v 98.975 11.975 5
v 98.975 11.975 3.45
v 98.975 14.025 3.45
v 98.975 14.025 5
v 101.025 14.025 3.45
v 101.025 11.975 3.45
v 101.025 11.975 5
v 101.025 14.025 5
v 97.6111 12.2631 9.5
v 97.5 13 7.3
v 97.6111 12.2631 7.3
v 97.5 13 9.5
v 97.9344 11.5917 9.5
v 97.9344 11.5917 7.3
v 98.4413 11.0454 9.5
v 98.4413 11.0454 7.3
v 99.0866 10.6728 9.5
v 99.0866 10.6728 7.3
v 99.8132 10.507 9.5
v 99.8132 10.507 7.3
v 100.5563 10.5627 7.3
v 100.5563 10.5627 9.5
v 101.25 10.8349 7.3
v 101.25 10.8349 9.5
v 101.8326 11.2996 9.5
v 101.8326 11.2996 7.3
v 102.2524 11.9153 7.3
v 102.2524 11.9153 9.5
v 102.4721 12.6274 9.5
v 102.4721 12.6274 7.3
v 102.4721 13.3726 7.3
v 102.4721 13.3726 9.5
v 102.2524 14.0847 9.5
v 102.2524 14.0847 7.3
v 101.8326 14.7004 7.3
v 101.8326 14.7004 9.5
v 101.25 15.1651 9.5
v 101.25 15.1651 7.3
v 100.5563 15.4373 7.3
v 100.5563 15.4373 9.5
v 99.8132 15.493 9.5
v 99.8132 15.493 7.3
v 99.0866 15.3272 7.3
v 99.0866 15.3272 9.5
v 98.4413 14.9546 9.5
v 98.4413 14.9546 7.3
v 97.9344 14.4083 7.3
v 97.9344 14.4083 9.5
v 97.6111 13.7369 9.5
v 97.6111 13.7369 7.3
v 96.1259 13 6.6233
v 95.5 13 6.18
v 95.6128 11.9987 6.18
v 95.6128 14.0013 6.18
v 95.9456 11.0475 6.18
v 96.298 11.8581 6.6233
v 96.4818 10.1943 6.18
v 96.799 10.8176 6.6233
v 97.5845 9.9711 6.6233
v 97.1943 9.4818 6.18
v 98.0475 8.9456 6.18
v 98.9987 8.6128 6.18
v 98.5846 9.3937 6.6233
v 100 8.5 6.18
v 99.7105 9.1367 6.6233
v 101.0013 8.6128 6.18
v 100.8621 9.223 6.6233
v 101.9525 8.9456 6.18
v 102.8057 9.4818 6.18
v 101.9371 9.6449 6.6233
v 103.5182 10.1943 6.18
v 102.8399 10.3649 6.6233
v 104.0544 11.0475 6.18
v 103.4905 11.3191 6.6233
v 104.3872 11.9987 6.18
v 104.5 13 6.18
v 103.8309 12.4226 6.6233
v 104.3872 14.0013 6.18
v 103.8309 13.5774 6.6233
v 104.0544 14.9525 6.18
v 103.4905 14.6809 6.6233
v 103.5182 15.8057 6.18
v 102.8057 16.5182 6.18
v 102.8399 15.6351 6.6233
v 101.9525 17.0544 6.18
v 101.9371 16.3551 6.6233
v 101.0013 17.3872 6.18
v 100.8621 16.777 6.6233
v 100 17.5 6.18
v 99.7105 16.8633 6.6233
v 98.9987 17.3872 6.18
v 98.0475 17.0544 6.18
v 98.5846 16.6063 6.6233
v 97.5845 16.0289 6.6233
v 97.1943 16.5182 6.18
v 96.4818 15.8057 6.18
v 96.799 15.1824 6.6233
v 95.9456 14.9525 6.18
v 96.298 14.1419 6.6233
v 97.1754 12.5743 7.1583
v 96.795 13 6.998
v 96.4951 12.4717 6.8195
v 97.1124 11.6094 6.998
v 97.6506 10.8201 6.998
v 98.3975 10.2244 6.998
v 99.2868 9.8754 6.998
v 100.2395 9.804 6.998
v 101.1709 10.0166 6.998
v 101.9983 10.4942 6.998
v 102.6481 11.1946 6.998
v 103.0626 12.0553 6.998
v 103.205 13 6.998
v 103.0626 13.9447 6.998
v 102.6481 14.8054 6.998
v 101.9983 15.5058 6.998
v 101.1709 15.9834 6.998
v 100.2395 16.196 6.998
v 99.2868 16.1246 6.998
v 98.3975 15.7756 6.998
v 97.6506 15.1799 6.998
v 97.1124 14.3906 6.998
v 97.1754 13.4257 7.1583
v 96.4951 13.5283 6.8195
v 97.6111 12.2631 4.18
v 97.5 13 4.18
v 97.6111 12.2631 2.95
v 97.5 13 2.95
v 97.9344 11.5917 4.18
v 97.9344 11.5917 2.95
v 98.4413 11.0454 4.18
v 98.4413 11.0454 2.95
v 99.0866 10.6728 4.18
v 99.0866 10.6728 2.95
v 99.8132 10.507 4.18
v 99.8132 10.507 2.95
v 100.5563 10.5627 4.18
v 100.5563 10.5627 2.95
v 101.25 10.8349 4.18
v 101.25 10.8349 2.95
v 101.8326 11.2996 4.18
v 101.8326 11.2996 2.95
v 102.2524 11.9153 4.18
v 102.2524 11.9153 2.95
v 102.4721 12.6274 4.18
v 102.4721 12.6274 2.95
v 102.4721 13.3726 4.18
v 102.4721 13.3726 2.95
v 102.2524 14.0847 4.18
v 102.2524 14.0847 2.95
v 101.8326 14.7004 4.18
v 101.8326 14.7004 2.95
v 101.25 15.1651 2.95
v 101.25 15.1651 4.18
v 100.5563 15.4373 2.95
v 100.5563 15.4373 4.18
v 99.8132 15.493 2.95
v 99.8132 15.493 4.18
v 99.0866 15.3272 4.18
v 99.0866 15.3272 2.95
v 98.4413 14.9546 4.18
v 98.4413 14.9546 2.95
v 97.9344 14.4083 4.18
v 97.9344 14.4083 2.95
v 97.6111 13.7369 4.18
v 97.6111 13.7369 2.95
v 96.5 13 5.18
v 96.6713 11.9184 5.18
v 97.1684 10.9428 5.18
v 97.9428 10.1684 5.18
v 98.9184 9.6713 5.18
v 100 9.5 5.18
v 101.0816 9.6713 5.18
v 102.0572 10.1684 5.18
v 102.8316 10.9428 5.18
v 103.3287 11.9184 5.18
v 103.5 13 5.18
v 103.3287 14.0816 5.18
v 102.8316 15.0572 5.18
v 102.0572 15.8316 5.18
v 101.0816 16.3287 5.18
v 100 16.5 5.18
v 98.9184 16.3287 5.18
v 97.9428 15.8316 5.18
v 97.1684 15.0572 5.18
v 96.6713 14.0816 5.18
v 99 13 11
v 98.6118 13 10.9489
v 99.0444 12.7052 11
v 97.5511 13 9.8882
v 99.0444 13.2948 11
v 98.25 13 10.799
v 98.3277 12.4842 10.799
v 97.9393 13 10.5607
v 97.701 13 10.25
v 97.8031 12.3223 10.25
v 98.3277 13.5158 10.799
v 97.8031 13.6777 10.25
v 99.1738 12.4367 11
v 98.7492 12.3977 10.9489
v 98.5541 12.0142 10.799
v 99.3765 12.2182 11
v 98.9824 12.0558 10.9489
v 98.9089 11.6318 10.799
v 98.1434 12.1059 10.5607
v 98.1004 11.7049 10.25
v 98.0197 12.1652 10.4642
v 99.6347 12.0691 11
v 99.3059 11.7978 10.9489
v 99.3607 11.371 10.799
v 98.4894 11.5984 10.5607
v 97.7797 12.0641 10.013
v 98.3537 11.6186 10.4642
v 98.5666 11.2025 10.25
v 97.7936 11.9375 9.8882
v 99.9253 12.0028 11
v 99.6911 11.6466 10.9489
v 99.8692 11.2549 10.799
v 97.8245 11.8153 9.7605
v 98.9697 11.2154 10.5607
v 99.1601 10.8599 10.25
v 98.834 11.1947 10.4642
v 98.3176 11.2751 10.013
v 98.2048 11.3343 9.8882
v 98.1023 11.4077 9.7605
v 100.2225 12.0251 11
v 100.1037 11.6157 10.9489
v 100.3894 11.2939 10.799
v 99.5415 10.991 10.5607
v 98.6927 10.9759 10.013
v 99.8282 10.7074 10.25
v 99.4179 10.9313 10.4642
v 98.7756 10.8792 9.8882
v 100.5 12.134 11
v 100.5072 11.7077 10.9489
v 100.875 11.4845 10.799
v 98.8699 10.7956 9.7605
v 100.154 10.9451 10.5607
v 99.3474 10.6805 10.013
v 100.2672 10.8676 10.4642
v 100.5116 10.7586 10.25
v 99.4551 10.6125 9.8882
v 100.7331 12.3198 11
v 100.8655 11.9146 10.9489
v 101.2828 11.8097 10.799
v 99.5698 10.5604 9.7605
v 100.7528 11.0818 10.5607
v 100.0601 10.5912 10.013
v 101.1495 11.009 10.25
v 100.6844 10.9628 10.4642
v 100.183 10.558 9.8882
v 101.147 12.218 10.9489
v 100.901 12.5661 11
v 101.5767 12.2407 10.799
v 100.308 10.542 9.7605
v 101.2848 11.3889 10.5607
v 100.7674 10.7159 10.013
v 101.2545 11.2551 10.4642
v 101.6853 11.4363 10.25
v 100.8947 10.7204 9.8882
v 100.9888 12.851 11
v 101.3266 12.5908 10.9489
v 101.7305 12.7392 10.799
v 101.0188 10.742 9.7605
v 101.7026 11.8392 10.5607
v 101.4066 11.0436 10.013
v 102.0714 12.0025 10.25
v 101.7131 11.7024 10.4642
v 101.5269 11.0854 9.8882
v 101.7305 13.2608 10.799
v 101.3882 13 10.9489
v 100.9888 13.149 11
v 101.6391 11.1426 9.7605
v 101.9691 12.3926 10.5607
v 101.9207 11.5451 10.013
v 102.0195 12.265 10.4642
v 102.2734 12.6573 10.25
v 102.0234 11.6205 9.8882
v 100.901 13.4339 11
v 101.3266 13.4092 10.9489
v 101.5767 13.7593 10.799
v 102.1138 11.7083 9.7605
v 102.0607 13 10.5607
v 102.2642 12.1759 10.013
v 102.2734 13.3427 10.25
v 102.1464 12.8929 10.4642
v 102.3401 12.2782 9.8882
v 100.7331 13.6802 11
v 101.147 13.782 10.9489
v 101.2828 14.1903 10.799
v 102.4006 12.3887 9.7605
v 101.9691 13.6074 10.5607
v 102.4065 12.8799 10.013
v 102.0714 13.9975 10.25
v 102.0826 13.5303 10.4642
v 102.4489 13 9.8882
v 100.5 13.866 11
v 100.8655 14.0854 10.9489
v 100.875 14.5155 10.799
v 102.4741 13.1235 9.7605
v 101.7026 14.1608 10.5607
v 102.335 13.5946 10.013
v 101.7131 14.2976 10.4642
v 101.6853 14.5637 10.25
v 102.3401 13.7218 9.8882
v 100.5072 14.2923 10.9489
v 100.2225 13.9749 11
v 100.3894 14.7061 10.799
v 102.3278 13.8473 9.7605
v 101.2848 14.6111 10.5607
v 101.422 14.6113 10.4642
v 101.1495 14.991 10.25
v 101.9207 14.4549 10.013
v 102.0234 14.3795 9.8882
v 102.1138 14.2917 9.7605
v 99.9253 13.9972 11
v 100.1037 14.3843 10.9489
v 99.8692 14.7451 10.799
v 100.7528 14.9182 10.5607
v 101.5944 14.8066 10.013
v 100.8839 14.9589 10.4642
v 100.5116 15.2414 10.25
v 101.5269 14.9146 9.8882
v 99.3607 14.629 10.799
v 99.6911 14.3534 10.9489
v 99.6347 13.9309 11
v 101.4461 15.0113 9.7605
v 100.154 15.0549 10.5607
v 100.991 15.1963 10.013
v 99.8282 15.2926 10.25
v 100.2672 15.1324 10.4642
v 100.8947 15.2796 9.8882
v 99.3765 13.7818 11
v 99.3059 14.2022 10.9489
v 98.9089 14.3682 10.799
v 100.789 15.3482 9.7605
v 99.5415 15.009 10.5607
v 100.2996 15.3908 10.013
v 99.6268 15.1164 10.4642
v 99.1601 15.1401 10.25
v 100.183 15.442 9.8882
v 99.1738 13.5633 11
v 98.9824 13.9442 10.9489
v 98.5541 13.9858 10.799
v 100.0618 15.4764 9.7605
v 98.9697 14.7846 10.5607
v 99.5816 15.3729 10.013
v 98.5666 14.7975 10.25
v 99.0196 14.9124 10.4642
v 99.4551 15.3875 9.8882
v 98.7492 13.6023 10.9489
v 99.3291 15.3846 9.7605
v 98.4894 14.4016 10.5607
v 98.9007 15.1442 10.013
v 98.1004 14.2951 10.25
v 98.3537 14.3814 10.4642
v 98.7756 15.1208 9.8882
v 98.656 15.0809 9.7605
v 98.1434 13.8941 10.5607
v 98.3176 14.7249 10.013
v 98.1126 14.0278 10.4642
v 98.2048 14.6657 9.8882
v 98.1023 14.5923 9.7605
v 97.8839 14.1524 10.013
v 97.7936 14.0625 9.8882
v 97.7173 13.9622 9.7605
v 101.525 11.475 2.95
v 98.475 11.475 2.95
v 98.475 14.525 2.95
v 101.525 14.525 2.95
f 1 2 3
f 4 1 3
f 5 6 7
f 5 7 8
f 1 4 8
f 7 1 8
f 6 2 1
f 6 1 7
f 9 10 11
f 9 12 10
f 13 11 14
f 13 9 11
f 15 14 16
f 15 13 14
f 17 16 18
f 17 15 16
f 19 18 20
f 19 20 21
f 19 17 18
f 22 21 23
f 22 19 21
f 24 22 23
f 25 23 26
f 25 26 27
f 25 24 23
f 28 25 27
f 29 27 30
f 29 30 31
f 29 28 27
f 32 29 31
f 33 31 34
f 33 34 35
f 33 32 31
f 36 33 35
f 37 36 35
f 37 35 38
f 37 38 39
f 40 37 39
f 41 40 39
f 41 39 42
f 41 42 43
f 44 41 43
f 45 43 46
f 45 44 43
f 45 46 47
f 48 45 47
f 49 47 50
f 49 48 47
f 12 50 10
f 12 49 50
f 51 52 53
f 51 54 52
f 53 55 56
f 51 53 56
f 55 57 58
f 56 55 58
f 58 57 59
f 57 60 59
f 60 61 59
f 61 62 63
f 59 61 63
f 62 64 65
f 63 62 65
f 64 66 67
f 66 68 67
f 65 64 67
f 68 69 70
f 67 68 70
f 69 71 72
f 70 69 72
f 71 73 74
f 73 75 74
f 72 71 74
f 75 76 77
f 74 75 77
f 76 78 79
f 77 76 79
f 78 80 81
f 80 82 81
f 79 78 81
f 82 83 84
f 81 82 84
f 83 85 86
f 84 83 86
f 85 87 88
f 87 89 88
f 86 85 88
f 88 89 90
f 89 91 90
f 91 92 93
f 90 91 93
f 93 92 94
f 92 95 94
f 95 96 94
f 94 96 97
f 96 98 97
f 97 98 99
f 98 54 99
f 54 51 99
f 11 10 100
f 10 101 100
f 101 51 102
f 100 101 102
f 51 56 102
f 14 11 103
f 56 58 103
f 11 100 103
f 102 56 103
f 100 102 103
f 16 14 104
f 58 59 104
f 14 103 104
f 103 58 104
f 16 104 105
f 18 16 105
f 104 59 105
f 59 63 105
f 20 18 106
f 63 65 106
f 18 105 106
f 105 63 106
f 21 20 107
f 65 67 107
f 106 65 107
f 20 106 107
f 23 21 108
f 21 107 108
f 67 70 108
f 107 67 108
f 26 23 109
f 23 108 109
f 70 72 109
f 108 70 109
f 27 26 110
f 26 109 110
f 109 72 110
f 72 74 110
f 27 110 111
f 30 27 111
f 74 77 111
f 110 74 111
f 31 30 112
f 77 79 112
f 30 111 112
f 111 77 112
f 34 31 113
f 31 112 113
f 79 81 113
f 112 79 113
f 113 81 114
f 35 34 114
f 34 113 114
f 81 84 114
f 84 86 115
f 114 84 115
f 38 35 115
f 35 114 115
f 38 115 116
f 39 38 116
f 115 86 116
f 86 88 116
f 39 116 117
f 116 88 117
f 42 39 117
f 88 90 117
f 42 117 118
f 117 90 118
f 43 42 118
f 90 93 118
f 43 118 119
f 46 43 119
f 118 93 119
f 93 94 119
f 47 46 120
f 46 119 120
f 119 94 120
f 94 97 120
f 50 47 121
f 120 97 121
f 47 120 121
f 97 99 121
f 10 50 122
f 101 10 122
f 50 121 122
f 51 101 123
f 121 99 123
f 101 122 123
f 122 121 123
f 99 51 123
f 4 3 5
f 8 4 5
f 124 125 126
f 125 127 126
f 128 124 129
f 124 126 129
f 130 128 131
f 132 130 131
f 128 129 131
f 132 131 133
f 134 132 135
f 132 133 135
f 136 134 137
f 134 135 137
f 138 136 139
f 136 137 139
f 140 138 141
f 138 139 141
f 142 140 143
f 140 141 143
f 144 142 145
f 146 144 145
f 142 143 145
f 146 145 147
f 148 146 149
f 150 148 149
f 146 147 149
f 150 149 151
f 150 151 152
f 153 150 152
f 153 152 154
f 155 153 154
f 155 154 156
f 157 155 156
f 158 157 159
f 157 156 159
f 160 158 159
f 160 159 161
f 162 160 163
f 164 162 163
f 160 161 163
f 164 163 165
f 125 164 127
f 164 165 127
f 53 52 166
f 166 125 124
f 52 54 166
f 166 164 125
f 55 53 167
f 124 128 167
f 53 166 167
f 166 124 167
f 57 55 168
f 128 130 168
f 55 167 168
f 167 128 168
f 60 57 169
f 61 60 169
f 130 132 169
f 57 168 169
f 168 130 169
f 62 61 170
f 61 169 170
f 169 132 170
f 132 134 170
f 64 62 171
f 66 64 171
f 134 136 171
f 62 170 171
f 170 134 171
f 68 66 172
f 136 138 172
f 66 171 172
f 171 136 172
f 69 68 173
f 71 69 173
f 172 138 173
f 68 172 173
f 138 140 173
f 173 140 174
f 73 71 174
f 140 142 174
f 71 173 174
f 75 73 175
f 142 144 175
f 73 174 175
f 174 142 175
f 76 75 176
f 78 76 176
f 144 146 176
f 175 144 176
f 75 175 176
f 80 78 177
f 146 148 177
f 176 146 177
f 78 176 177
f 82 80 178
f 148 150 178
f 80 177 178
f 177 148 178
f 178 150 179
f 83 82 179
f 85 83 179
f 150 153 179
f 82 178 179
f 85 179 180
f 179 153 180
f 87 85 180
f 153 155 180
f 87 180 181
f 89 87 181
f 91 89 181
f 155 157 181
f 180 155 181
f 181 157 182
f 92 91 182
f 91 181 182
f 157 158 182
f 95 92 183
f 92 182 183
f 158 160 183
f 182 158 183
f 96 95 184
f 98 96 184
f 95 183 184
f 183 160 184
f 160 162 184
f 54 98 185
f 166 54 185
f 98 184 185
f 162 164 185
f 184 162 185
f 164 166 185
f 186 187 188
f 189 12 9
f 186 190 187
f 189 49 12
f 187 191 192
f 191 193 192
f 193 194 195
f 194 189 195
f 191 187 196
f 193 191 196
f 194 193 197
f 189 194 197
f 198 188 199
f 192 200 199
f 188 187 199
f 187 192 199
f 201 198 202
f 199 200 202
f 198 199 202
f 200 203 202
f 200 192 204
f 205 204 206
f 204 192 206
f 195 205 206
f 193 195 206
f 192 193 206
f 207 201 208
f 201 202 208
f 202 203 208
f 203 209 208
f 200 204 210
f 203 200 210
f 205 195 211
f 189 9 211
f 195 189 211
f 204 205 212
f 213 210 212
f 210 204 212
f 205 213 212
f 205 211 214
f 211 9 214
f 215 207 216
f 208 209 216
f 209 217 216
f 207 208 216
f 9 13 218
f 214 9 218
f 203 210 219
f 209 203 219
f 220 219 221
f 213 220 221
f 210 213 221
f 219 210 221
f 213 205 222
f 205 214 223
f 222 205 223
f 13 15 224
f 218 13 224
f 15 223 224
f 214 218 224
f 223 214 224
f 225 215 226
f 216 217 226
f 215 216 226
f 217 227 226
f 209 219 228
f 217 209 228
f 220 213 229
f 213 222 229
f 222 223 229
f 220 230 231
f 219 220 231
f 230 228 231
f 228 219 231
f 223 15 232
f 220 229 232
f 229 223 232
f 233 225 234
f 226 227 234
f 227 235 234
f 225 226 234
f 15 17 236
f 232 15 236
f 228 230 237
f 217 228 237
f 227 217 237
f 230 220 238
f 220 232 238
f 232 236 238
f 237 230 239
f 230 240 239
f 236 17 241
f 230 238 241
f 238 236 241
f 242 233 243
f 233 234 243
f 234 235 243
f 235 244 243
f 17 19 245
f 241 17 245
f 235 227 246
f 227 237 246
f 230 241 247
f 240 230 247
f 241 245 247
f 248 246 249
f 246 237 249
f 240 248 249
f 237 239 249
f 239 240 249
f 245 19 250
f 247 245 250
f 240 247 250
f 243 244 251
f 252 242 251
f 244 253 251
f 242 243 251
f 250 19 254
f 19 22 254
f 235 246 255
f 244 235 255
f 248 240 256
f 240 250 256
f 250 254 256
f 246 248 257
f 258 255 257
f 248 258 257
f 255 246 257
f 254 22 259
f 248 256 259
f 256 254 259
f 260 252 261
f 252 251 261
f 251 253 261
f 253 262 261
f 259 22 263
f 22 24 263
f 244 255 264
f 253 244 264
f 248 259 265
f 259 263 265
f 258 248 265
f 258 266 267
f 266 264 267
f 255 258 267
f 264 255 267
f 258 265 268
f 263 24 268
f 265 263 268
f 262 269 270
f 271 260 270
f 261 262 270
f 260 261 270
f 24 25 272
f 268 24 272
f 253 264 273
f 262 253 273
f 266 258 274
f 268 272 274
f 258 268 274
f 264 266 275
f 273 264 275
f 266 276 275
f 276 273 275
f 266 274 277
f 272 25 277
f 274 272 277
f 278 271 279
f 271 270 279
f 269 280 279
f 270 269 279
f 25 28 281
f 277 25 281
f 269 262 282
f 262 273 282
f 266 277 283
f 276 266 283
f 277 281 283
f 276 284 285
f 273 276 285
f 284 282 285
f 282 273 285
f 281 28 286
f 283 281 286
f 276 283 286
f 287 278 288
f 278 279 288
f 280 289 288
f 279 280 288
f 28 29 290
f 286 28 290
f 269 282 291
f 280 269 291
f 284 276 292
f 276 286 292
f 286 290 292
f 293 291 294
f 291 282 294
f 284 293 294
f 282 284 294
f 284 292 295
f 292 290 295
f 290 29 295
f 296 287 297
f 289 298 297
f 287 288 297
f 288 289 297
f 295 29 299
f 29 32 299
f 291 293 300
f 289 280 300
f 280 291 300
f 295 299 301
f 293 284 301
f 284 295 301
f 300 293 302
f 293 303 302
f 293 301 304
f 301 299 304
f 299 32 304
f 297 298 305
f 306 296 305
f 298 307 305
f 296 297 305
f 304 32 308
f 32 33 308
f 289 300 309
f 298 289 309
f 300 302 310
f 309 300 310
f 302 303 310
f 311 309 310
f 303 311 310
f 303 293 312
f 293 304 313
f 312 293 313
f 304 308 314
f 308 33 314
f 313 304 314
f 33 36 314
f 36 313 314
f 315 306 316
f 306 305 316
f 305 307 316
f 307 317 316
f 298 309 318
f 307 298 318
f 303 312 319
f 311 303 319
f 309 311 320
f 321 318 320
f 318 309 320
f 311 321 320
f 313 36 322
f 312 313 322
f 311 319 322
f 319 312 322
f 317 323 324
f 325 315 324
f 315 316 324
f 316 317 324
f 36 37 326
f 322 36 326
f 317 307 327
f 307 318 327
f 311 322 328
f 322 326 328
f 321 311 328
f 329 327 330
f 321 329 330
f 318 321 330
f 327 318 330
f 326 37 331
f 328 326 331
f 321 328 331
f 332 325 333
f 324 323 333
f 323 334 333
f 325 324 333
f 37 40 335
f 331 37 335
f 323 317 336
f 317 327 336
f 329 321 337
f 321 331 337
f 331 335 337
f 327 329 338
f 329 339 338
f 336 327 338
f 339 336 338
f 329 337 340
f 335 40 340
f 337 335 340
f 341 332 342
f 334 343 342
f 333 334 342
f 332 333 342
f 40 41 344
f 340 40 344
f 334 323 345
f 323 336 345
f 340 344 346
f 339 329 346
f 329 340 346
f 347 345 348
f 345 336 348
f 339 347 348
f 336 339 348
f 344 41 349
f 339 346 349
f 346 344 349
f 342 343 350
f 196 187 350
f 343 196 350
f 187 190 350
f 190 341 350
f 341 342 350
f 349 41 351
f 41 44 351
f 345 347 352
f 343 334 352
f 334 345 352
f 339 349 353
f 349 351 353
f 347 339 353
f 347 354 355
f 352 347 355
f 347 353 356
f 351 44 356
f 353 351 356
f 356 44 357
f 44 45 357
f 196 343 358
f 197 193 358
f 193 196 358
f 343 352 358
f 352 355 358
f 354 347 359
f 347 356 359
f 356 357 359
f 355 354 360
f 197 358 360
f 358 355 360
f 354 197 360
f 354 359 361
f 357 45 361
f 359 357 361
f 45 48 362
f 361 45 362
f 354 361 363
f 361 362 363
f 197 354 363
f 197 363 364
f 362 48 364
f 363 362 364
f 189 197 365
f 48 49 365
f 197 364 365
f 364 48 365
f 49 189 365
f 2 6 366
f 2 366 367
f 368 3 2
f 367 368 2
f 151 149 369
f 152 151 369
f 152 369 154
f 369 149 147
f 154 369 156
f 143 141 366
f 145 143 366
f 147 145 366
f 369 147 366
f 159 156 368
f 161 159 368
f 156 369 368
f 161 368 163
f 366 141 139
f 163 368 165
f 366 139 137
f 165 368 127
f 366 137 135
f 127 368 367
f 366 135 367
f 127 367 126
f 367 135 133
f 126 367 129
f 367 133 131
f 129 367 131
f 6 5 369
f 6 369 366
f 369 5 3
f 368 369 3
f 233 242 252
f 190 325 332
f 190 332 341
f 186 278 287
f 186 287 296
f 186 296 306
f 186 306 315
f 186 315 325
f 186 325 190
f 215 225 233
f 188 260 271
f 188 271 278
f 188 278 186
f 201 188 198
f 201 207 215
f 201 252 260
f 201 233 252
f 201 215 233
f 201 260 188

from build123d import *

# Parameters (mm, degrees)
SKETCH036_W     = 2.05
SKETCH036_H     = 2.05
POCKET015_DEPTH = 5
CHAMFER006_SIZE = 0.5


with BuildPart() as part:
    # Sketch035 (on DatumPlane) → Revolution (revolve)
    with BuildSketch(Plane(origin=(100, 13, 0), x_dir=(1, 0, 0), z_dir=(0, -1, 0))):
        with BuildLine():
            ThreePointArc((-2.5, 7.3), (-3.544517, 6.819494), (-4.5, 6.18))
            Line((-4.5, 6.18), (-2.5, 4.18))
            Line((-2.5, 4.18), (-2.5, 2.95))
            Line((-2.5, 2.95), (0, 2.95))
            Line((0, 11), (0, 2.95))
            Line((-1, 11), (0, 11))
            ThreePointArc((-1, 11), (-2.06066, 10.56066), (-2.5, 9.5))
            Line((-2.5, 7.3), (-2.5, 9.5))
        make_face()
    revolve(axis=Axis((100, 13, 0), (0, 0, 1)))

    # Sketch036 → Pocket015 (cut)
    with BuildSketch(Plane.XY):
        with Locations((100, 13)):
            Rectangle(SKETCH036_W, SKETCH036_H)
    extrude(amount=POCKET015_DEPTH, mode=Mode.SUBTRACT)

    # Chamfer006
    chamfer006_edges = [part.edges().sort_by_distance(p)[0] for p in [
        (101.025, 13, 2.95),
        (100, 14.025, 2.95),
        (98.975, 13, 2.95),
        (100, 11.975, 2.95),
    ]]
    chamfer(chamfer006_edges, length=CHAMFER006_SIZE)


solid = part.part
